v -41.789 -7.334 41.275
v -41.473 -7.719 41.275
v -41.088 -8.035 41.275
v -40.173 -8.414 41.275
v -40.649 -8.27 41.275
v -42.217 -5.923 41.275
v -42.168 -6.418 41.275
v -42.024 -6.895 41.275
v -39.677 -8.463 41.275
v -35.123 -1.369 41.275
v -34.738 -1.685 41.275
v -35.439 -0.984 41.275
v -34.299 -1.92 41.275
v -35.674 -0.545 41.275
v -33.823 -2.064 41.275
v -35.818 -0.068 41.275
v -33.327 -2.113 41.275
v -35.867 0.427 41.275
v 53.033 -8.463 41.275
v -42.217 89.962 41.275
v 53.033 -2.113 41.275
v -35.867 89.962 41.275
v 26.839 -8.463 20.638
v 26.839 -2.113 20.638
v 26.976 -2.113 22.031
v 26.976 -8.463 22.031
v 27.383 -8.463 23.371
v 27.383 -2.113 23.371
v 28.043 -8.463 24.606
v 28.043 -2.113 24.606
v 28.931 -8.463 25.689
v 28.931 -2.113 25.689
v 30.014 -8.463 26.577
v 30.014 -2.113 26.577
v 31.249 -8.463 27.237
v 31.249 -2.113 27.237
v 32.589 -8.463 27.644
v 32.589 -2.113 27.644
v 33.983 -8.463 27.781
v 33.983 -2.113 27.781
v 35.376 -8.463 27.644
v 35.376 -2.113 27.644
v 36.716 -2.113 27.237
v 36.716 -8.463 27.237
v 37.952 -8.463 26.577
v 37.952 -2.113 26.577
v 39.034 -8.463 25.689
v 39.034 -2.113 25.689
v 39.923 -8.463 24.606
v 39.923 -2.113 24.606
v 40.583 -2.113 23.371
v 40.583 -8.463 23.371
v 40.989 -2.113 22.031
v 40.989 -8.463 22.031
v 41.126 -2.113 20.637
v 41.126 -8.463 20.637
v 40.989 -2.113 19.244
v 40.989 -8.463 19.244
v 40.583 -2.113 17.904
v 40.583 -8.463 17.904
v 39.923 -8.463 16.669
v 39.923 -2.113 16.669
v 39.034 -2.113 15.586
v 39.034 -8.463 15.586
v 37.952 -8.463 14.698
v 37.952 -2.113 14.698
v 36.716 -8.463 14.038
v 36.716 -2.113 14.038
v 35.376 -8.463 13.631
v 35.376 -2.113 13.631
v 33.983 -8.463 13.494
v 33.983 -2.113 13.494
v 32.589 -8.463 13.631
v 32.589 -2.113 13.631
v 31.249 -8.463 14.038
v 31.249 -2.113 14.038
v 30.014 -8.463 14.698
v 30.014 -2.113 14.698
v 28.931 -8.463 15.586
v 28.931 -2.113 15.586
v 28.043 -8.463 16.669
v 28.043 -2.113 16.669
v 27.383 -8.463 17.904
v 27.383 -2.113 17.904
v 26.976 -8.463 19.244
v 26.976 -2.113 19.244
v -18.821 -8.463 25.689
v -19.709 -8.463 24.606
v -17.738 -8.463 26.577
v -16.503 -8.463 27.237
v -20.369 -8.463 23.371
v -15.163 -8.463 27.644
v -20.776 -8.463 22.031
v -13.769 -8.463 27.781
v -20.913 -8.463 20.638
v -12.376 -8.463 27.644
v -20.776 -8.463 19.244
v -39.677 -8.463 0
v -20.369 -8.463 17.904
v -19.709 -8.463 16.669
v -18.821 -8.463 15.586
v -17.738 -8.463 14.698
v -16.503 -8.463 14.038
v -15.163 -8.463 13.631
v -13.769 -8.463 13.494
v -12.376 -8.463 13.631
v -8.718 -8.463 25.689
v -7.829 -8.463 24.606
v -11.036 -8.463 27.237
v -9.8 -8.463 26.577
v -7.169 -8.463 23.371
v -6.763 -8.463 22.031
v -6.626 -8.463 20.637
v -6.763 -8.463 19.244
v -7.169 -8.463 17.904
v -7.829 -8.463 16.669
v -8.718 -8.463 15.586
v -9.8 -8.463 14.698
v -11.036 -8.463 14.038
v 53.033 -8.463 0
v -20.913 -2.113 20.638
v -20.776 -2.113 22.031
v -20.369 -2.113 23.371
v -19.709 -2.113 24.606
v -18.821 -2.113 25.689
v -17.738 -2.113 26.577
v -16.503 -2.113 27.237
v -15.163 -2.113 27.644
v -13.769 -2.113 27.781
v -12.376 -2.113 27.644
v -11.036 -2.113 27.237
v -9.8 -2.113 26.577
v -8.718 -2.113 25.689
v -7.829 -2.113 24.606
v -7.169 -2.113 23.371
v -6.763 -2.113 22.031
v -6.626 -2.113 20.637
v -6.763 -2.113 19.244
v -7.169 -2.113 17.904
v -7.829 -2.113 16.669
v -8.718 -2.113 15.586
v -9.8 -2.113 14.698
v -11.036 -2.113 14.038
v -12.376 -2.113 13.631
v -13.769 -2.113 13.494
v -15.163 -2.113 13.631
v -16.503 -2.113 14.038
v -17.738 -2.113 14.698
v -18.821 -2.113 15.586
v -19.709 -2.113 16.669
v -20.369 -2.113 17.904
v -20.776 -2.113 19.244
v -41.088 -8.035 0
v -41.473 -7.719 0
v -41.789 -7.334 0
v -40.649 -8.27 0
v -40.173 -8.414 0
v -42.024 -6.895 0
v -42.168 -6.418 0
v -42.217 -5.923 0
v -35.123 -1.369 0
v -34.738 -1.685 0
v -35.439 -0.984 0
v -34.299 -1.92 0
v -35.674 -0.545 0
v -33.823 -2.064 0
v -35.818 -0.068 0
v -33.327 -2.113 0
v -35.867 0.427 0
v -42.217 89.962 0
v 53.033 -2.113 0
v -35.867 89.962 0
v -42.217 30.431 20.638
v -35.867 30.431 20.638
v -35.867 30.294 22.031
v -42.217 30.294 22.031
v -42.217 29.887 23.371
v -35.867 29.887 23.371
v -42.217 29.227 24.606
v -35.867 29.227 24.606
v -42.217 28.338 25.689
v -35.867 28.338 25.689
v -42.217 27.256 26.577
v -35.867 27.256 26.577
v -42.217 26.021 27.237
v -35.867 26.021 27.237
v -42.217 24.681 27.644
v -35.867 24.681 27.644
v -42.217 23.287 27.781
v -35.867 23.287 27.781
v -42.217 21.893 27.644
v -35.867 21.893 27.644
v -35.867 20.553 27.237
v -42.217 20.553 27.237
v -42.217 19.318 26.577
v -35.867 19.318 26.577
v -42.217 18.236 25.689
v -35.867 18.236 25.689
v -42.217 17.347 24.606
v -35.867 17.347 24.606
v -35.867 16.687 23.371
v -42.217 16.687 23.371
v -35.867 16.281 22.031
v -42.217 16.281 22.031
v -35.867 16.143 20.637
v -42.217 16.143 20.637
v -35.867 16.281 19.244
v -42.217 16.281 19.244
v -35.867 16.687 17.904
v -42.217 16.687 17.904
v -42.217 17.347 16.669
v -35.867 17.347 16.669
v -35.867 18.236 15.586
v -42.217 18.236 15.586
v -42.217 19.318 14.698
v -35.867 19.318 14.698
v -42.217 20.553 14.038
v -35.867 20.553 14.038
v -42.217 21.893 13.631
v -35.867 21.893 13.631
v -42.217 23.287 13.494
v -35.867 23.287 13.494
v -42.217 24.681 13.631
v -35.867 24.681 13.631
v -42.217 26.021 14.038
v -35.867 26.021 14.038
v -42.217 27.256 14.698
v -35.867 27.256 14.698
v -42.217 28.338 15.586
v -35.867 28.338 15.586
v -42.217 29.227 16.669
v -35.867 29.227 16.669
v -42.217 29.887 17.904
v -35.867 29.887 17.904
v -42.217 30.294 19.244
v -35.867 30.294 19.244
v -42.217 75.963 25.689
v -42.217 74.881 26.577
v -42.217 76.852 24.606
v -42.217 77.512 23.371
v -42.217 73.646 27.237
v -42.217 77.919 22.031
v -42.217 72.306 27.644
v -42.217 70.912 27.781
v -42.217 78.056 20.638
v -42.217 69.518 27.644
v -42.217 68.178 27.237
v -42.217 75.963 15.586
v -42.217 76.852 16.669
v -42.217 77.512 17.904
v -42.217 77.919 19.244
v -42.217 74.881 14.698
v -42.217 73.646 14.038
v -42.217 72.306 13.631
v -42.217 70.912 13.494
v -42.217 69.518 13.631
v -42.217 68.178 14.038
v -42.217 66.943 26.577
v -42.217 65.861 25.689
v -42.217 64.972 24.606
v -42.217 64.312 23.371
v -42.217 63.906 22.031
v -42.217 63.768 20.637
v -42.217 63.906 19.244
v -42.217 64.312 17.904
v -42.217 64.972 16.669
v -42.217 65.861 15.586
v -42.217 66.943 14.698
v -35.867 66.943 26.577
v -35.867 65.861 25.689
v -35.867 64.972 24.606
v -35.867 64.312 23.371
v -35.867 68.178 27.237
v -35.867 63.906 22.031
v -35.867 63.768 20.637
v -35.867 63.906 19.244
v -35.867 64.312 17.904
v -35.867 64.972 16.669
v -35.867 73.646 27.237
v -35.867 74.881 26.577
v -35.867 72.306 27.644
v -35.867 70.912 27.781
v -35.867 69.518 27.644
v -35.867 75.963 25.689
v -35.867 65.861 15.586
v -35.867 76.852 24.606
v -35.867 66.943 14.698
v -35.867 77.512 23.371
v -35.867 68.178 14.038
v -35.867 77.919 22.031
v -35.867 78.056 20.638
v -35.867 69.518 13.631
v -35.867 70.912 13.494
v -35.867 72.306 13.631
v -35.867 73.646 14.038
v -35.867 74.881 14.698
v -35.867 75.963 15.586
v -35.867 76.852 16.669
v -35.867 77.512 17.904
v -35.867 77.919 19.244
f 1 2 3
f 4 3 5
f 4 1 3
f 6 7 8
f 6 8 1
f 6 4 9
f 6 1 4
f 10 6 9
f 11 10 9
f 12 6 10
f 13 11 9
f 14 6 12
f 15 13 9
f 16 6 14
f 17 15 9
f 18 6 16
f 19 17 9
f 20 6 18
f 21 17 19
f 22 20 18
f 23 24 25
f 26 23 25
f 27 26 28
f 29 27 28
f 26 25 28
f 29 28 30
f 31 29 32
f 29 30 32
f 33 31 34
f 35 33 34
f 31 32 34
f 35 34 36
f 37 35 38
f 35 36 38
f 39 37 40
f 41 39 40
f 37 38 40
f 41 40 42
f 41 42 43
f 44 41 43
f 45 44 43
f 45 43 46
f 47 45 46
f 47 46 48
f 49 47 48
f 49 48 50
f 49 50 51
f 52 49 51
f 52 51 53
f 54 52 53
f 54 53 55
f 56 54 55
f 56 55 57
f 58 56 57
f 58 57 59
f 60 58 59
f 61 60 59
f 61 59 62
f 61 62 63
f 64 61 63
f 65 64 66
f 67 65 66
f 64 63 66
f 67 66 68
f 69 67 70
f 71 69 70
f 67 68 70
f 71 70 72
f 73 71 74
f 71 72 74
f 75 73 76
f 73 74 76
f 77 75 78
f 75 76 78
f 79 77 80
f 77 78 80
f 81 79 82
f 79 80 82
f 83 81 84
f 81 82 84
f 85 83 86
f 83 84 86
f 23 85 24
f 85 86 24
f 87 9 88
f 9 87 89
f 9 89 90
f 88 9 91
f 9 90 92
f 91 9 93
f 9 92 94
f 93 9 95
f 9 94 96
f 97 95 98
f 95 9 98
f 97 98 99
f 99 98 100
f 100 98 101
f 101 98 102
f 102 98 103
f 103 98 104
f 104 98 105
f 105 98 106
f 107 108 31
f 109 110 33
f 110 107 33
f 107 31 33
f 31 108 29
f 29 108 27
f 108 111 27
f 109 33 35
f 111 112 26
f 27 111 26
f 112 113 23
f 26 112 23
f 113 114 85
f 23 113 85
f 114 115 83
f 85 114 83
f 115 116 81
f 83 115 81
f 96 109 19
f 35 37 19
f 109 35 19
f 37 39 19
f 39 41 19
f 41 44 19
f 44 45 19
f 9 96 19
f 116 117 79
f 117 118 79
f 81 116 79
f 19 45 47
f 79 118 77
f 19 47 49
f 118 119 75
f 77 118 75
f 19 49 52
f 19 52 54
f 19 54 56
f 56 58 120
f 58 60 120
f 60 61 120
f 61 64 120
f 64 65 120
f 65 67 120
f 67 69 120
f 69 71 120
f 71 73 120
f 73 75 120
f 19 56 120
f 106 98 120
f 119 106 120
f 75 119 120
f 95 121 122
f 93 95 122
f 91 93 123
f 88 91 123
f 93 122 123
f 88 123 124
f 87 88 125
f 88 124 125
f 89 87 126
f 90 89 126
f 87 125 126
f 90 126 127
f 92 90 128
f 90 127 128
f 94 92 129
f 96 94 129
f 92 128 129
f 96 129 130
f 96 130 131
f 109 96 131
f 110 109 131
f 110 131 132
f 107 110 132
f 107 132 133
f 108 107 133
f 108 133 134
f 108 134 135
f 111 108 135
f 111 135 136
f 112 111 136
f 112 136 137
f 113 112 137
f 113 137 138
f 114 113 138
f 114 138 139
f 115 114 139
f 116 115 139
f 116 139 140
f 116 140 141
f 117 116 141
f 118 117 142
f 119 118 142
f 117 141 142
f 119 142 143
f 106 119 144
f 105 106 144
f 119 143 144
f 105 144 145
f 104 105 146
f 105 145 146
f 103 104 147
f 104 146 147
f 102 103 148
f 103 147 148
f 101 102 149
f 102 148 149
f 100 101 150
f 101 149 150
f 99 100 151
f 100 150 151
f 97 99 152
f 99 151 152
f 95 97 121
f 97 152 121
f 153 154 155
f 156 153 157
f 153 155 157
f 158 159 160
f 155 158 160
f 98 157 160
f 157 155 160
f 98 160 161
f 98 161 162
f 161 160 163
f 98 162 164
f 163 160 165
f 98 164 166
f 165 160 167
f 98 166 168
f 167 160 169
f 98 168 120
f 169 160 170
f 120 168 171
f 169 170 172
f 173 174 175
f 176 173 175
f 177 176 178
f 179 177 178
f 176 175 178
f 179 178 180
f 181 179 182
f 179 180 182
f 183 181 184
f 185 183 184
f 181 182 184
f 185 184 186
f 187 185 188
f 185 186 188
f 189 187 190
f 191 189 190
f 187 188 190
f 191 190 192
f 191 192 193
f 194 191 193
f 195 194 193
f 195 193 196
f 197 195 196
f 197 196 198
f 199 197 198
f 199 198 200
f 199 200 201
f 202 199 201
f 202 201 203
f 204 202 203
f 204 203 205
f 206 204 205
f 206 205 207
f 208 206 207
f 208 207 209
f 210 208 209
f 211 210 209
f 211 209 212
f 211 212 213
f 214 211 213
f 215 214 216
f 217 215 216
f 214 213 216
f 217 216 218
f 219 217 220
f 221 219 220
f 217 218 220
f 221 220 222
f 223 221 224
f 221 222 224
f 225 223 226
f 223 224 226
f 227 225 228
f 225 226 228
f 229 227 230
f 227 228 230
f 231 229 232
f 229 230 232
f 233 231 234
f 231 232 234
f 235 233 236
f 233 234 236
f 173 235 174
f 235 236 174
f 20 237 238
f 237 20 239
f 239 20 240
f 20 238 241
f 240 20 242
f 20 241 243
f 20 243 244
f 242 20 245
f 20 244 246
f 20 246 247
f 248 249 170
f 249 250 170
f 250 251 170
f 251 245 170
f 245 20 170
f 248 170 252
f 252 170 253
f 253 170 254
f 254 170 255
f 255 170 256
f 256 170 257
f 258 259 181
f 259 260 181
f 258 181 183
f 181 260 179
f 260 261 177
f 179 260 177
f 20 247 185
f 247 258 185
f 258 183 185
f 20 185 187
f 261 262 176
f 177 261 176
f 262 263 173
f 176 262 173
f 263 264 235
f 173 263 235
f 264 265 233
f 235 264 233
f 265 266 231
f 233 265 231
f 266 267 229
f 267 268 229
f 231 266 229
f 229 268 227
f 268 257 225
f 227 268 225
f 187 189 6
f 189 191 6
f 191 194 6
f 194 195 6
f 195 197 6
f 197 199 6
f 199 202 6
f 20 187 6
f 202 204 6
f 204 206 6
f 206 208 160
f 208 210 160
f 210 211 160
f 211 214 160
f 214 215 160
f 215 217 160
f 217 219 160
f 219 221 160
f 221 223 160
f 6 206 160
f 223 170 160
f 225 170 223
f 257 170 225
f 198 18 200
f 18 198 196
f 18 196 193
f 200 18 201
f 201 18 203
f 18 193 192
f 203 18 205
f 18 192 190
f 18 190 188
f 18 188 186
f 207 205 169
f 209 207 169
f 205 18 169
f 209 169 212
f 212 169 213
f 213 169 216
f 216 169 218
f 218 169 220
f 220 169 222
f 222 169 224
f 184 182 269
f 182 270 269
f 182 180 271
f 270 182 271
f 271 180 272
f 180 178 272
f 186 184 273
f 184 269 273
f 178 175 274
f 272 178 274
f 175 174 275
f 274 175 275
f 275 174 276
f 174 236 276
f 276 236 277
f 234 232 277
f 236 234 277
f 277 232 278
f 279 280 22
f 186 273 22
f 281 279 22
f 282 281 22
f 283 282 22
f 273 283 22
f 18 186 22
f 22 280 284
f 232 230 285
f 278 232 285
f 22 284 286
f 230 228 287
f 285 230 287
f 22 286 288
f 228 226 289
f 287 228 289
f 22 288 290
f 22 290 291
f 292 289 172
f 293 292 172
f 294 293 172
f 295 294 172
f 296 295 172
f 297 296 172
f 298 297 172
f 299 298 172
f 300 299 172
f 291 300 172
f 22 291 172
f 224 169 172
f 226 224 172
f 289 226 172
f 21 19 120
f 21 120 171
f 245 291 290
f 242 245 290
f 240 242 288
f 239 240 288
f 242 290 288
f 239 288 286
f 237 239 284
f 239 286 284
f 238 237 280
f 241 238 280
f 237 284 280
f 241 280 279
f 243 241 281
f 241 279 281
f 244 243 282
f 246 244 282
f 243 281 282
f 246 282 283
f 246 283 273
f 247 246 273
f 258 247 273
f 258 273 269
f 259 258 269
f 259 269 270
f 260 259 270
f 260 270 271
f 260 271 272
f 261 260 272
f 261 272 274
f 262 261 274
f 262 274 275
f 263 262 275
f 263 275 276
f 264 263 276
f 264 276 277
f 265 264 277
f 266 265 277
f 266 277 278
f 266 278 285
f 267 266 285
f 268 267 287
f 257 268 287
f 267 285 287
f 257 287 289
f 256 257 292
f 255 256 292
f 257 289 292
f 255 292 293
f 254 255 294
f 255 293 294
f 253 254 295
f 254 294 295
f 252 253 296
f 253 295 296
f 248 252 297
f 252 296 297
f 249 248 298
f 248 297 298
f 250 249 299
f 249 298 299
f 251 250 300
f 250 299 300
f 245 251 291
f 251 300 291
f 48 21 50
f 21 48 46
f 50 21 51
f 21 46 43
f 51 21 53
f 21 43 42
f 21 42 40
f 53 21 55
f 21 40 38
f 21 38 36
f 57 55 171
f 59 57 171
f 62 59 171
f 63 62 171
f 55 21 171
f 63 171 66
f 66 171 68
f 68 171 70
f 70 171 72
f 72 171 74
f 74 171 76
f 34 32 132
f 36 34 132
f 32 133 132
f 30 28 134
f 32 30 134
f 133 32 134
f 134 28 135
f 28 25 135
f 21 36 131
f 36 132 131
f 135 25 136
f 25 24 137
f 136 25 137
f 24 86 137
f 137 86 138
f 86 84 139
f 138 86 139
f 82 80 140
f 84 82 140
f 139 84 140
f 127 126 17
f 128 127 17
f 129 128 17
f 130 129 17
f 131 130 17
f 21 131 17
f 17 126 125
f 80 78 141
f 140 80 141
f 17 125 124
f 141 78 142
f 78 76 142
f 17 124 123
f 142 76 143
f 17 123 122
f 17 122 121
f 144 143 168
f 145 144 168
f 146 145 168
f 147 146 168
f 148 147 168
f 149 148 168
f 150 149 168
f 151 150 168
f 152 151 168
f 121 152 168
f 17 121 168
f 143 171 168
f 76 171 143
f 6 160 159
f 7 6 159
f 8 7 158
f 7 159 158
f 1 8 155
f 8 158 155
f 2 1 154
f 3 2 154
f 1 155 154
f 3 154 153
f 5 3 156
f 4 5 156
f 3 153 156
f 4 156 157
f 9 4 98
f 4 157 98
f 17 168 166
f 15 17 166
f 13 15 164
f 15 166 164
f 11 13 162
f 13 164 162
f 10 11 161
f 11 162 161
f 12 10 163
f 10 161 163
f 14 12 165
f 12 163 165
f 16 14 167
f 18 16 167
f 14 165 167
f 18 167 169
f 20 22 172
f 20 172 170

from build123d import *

# Parameters (mm, degrees)
BOSS_EXTRUDE1_DEPTH = 41.275
SKETCH2_R           = 7.14375
CUT_EXTRUDE1_DEPTH  = 41.275
SKETCH3_R           = 7.14375
CUT_EXTRUDE2_DEPTH  = 41.275


with BuildPart() as part:
    # Sketch1 → Boss-Extrude1 (new body)
    with BuildSketch(Plane.XY):
        with BuildLine():
            Line((-35.867305165, 89.962083988), (-42.217305165, 89.962083988))
            Line((-42.217305165, 89.962083988), (-42.217305165, -2.112916012))
            Line((-42.217305165, -2.112916012), (-42.217305165, -5.922916012))
            ThreePointArc((-42.217305165, -5.922916012), (-41.473356389, -7.718967236), (-39.677305165, -8.462916012))
            Line((-39.677305165, -8.462916012), (-35.867305165, -8.462916012))
            Line((-35.867305165, -8.462916012), (53.032694835, -8.462916012))
            Line((53.032694835, -8.462916012), (53.032694835, -2.112916012))
            Line((53.032694835, -2.112916012), (-33.327305165, -2.112916012))
            ThreePointArc((-33.327305165, -2.112916012), (-35.123356389, -1.368967236), (-35.867305165, 0.427083988))
            Line((-35.867305165, 0.427083988), (-35.867305165, 89.962083988))
        make_face()
    extrude(amount=BOSS_EXTRUDE1_DEPTH)

    # Sketch2 → Cut-Extrude1 (cut)
    with BuildSketch(Plane(origin=(-35.867305165, 0, 0), x_dir=(0, 0, -1), z_dir=(1, 0, 0))):
        with Locations(Location((-20.6375, 70.912083988, 0), (0, 0, 90))):
            Circle(SKETCH2_R)
        with Locations(Location((-20.6375, 23.287083988, 0), (0, 0, 90))):
            Circle(SKETCH2_R)
    extrude(amount=-CUT_EXTRUDE1_DEPTH, mode=Mode.SUBTRACT)

    # Sketch3 → Cut-Extrude2 (cut)
    with BuildSketch(Plane(origin=(0, -2.112916012, 0), x_dir=(1, 0, 0), z_dir=(0, 1, 0))):
        with Locations(Location((-13.769305165, -20.6375, 0), (0, 0, 180))):
            Circle(SKETCH3_R)
        with Locations(Location((33.982694835, -20.6375, 0), (0, 0, 180))):
            Circle(SKETCH3_R)
    extrude(amount=-CUT_EXTRUDE2_DEPTH, mode=Mode.SUBTRACT)


solid = part.part
